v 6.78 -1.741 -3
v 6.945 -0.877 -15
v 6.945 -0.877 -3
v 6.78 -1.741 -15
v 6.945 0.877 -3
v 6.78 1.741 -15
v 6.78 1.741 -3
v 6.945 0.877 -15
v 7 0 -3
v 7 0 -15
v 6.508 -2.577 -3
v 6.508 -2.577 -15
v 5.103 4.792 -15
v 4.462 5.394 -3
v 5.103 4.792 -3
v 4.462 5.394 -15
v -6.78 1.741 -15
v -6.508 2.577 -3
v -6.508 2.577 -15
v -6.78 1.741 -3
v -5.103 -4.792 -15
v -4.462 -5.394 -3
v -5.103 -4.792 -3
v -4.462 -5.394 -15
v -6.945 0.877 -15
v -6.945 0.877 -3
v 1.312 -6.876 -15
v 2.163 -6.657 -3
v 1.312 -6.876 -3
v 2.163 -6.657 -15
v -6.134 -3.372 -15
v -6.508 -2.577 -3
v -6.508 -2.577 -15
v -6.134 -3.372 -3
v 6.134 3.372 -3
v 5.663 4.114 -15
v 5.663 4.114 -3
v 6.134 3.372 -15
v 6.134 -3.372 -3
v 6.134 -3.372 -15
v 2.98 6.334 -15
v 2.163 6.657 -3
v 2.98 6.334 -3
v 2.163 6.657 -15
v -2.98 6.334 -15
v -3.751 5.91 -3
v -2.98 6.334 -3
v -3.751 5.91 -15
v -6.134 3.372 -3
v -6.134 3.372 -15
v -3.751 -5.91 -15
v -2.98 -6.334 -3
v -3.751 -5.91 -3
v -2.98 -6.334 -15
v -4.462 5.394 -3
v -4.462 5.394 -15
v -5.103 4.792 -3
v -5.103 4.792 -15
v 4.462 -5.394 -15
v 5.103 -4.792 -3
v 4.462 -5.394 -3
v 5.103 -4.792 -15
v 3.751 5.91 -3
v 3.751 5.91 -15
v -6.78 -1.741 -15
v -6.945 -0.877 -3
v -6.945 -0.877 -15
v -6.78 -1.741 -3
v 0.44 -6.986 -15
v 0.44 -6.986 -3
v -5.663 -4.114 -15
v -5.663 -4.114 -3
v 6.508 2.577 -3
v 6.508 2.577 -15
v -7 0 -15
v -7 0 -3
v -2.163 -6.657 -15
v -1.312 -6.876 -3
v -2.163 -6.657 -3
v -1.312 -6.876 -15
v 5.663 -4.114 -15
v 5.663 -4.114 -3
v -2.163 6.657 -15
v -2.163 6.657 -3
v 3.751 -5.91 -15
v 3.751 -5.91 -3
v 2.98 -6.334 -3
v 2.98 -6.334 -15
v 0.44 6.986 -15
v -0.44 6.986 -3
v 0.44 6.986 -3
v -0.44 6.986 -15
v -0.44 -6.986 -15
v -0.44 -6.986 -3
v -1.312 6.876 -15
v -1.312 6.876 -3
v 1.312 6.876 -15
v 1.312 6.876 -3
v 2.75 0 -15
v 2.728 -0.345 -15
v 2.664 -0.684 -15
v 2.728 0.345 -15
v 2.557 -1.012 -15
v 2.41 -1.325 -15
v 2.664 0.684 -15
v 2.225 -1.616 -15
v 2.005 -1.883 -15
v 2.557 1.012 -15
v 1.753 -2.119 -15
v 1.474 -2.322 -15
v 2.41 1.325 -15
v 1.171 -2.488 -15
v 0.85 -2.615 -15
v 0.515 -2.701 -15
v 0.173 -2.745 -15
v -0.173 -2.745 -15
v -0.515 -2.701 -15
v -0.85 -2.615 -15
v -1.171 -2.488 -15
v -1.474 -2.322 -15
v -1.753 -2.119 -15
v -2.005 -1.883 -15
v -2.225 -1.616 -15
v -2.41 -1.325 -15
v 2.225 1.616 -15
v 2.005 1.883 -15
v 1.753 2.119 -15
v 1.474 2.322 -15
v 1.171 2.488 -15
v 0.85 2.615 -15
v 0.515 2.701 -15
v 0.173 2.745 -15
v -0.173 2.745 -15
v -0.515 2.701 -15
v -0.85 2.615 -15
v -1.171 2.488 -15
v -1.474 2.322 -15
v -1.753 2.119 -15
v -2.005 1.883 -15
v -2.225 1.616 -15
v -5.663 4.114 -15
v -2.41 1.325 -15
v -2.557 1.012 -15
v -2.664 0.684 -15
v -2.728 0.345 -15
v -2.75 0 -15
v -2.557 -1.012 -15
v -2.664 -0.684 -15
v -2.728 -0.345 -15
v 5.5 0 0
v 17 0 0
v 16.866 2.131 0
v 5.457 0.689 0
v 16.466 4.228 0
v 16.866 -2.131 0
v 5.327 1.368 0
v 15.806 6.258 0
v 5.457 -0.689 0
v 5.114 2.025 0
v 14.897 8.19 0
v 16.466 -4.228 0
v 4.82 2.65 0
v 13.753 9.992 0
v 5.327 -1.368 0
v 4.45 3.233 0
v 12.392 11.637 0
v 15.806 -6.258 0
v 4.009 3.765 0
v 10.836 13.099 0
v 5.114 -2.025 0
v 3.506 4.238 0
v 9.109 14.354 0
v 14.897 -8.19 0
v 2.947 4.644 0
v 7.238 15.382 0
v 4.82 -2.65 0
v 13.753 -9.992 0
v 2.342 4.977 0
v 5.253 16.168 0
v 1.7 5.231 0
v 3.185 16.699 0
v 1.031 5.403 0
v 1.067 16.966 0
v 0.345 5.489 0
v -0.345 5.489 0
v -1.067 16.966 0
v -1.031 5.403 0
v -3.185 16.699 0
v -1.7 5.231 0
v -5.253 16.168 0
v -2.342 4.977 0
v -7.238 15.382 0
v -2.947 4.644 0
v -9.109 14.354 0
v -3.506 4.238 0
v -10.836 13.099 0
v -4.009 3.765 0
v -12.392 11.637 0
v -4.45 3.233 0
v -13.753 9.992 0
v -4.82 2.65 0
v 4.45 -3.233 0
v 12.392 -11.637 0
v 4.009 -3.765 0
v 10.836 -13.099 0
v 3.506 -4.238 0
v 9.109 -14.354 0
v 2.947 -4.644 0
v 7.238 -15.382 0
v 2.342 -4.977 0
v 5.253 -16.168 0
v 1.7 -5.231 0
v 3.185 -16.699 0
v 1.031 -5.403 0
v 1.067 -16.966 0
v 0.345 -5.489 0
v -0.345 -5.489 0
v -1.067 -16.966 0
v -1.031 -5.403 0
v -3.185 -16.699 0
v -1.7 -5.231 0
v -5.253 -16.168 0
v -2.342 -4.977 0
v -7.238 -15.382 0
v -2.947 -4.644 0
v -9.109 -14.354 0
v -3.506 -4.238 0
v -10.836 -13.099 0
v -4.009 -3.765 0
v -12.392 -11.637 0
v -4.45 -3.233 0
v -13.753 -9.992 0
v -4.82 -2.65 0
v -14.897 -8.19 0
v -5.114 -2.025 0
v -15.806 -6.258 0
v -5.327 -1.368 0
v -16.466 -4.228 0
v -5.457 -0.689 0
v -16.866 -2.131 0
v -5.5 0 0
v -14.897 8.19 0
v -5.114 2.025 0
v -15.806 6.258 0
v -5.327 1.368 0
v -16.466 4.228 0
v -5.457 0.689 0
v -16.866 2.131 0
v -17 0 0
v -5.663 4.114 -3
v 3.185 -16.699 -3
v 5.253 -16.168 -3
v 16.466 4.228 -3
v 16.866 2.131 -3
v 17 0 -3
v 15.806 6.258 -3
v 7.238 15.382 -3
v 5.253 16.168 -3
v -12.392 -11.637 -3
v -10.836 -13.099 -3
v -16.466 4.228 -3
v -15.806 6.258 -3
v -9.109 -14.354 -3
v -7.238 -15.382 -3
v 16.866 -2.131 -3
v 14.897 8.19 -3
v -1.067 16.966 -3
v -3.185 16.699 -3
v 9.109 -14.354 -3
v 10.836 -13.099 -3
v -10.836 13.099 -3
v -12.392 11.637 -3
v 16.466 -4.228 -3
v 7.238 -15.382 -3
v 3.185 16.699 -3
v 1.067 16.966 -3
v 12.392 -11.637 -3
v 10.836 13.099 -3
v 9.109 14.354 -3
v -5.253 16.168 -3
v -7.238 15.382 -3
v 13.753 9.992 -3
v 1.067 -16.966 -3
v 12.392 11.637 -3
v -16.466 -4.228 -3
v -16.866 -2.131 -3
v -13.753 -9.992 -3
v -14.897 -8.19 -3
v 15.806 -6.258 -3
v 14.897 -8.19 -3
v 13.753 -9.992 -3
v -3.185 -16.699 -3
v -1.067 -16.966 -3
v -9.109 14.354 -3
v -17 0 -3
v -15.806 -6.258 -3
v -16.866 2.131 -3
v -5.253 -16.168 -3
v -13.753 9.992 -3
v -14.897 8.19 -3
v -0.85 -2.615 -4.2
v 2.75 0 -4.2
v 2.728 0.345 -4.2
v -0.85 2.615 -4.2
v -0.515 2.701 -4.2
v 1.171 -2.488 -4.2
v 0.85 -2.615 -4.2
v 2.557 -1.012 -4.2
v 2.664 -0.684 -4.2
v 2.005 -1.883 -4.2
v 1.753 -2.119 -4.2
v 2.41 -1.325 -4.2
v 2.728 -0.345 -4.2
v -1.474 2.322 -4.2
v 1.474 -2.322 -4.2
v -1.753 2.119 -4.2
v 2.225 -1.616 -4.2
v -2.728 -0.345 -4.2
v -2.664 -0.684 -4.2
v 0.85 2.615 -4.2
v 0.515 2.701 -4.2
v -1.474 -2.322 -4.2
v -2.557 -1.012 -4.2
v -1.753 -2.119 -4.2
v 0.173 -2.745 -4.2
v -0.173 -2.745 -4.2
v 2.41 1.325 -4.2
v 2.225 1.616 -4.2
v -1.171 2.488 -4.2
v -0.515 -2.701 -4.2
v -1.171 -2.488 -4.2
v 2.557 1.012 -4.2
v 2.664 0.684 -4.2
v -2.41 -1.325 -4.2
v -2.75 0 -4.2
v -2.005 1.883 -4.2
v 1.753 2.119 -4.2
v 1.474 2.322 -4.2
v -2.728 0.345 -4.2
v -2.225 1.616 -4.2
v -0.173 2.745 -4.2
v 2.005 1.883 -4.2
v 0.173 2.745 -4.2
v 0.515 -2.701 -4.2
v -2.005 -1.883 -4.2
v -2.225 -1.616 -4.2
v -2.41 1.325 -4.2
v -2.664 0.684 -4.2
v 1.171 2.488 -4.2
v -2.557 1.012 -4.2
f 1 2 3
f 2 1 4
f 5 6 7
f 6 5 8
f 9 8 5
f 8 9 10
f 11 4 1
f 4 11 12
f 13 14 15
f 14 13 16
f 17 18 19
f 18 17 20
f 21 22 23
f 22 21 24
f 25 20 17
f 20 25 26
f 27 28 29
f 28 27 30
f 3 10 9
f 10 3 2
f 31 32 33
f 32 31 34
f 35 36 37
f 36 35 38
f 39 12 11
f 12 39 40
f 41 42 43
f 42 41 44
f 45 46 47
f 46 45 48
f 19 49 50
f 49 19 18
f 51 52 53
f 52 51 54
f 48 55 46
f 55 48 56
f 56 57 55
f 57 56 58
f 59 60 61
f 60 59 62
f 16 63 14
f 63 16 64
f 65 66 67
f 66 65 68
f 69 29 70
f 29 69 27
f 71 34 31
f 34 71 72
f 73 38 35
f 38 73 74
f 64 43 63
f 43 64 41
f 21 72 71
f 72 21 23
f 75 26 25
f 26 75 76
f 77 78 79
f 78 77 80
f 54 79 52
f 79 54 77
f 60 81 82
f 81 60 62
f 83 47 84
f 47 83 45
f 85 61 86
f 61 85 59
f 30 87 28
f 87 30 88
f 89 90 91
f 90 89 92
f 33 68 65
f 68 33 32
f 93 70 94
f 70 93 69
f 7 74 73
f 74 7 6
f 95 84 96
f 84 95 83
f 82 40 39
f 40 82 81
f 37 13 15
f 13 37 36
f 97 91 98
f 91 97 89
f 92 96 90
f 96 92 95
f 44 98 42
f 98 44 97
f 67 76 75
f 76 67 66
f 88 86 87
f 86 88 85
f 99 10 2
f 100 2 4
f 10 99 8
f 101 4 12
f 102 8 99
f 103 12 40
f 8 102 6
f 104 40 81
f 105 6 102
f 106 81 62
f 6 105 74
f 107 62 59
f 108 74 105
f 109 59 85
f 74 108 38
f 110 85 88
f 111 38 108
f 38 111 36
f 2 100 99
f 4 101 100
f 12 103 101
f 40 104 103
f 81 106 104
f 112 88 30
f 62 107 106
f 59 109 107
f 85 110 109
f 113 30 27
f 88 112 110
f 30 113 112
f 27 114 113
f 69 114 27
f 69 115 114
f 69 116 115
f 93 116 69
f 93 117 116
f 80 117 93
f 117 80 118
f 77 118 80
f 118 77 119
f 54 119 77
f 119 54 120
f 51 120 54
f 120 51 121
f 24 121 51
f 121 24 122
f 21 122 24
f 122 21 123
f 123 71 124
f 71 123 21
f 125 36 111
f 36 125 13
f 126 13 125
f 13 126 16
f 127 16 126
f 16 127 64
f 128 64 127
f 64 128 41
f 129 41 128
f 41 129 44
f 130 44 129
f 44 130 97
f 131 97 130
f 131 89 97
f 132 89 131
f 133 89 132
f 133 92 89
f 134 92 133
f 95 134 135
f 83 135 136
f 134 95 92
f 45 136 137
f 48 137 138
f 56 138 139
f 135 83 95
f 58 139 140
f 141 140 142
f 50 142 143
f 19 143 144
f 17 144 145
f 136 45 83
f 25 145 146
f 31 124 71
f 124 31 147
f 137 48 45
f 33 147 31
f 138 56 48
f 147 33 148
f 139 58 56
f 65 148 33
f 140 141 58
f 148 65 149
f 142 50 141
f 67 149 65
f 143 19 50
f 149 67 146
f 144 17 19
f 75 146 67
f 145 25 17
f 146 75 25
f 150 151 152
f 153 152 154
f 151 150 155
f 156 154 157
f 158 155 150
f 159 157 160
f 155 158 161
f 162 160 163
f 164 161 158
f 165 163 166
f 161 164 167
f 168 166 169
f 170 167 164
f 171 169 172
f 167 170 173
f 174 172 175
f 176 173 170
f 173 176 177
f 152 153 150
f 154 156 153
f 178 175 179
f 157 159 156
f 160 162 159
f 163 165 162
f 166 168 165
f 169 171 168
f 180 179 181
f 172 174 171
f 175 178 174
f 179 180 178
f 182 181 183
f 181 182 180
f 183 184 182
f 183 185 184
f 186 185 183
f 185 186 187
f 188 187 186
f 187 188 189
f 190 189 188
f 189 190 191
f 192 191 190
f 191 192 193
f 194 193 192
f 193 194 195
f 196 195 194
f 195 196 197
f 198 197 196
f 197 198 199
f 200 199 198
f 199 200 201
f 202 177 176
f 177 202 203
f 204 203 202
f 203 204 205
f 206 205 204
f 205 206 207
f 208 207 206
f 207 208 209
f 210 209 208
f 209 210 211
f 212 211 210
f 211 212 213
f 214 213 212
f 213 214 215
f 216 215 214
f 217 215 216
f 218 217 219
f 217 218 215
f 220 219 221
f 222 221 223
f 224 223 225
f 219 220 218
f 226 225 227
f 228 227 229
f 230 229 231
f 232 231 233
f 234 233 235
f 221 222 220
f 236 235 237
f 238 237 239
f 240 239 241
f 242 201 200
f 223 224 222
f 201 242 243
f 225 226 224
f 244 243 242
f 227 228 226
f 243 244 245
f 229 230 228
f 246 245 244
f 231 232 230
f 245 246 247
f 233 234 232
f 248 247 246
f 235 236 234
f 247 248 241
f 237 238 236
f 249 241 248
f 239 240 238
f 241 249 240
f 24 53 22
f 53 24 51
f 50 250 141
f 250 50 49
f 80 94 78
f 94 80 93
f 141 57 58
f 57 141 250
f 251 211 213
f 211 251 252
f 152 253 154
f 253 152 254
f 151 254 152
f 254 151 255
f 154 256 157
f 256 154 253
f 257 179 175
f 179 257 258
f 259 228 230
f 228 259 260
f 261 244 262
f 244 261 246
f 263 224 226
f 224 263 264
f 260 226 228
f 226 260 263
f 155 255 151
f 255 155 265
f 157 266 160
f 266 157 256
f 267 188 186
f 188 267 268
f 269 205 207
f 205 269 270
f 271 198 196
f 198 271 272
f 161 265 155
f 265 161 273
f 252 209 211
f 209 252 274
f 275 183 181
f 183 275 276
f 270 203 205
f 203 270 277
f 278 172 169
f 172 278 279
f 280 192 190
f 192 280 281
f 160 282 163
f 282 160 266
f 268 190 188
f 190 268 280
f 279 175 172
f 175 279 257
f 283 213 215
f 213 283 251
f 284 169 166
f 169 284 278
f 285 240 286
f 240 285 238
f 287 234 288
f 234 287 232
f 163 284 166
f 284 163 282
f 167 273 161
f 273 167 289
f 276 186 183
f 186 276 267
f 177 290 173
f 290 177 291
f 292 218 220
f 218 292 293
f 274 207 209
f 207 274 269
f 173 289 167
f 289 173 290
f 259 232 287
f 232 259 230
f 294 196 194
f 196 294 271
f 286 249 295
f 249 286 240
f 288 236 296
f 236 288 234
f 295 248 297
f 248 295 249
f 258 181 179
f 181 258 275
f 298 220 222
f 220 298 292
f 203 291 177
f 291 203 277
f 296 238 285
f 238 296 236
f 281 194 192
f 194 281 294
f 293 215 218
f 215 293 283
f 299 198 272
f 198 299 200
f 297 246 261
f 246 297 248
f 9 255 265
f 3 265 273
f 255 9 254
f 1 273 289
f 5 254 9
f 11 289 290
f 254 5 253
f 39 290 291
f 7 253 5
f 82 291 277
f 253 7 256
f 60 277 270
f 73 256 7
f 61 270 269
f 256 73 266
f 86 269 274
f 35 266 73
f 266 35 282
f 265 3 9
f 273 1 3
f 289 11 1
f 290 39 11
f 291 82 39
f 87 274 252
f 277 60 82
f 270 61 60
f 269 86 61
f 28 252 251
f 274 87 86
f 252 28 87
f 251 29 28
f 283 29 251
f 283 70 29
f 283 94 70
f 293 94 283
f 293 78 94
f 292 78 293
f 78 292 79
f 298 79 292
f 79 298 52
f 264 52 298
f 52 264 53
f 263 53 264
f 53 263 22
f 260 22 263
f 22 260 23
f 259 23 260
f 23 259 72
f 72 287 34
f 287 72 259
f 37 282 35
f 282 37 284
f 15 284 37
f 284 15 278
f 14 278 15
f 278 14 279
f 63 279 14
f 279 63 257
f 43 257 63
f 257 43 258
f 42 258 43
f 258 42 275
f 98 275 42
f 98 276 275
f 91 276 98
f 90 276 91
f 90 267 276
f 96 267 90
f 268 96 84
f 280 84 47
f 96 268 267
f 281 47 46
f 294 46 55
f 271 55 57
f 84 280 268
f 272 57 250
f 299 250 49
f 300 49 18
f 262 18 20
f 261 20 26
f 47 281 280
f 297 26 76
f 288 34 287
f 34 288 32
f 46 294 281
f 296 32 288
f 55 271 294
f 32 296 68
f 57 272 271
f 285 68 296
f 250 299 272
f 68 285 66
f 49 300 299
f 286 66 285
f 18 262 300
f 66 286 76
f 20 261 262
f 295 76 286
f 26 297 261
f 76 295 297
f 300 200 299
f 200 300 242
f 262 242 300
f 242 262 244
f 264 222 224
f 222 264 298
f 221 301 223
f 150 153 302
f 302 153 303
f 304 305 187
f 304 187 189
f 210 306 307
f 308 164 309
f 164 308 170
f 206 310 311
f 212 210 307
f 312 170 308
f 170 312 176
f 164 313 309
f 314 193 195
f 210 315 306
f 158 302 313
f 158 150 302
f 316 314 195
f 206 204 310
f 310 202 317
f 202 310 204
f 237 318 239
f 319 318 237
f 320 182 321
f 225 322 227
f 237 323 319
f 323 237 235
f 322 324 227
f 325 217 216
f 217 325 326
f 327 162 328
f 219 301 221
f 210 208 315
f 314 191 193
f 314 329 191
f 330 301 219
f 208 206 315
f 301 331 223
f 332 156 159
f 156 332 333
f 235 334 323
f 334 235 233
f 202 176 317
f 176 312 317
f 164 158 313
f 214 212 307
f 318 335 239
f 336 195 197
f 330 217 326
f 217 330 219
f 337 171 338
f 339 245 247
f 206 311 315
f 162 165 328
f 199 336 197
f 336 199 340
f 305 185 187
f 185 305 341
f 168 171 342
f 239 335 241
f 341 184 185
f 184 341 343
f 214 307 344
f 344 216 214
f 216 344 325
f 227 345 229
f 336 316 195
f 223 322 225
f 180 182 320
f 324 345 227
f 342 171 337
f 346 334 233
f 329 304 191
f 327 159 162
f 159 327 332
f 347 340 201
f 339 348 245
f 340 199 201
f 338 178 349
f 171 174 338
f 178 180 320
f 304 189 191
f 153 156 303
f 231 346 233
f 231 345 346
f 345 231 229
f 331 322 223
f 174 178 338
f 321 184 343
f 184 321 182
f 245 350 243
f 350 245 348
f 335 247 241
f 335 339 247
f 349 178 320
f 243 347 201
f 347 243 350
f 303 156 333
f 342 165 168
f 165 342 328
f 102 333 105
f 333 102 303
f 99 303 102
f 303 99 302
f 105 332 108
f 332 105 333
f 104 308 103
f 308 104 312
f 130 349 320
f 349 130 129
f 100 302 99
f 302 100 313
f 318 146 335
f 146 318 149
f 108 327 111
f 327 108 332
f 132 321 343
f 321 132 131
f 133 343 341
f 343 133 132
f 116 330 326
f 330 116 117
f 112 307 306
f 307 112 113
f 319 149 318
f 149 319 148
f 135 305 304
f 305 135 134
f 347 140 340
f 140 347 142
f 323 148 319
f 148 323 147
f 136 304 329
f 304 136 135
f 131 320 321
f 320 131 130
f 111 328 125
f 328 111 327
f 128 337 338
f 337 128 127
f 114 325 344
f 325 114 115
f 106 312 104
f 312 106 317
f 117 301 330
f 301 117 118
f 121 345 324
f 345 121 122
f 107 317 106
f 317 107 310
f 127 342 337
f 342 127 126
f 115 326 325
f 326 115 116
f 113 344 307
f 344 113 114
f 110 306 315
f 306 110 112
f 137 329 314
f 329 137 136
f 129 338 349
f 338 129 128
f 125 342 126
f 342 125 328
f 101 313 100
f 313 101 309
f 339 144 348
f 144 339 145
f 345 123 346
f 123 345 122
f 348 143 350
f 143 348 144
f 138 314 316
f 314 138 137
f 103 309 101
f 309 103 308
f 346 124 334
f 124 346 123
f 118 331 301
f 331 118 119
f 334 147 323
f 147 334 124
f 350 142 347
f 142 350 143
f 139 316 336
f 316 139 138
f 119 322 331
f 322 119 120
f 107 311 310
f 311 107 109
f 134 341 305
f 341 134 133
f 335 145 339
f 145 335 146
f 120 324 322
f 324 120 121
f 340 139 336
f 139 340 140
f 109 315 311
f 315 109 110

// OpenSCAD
$fn = 50;


difference() {
	union() {
		translate(v = [0, 0, -15.0000000000]) {
			cylinder(h = 15, r = 7.0000000000);
		}
		translate(v = [0, 0, -3.0000000000]) {
			cylinder(h = 3, r = 17.0000000000);
		}
	}
	union() {
		translate(v = [0, 0, 0]) {
			rotate(a = [0, 0, 0]) {
				difference() {
					union() {
						#translate(v = [0, 0, -15.0000000000]) {
							cylinder(h = 15, r = 2.2500000000);
						}
						#translate(v = [0, 0, -4.2000000000]) {
							cylinder(h = 4.2000000000, r1 = 2.7500000000, r2 = 5.5000000000);
						}
						#translate(v = [0, 0, -15.0000000000]) {
							cylinder(h = 15, r = 2.7500000000);
						}
						#translate(v = [0, 0, -15.0000000000]) {
							cylinder(h = 15, r = 2.2500000000);
						}
					}
					union();
				}
			}
		}
	}
}
